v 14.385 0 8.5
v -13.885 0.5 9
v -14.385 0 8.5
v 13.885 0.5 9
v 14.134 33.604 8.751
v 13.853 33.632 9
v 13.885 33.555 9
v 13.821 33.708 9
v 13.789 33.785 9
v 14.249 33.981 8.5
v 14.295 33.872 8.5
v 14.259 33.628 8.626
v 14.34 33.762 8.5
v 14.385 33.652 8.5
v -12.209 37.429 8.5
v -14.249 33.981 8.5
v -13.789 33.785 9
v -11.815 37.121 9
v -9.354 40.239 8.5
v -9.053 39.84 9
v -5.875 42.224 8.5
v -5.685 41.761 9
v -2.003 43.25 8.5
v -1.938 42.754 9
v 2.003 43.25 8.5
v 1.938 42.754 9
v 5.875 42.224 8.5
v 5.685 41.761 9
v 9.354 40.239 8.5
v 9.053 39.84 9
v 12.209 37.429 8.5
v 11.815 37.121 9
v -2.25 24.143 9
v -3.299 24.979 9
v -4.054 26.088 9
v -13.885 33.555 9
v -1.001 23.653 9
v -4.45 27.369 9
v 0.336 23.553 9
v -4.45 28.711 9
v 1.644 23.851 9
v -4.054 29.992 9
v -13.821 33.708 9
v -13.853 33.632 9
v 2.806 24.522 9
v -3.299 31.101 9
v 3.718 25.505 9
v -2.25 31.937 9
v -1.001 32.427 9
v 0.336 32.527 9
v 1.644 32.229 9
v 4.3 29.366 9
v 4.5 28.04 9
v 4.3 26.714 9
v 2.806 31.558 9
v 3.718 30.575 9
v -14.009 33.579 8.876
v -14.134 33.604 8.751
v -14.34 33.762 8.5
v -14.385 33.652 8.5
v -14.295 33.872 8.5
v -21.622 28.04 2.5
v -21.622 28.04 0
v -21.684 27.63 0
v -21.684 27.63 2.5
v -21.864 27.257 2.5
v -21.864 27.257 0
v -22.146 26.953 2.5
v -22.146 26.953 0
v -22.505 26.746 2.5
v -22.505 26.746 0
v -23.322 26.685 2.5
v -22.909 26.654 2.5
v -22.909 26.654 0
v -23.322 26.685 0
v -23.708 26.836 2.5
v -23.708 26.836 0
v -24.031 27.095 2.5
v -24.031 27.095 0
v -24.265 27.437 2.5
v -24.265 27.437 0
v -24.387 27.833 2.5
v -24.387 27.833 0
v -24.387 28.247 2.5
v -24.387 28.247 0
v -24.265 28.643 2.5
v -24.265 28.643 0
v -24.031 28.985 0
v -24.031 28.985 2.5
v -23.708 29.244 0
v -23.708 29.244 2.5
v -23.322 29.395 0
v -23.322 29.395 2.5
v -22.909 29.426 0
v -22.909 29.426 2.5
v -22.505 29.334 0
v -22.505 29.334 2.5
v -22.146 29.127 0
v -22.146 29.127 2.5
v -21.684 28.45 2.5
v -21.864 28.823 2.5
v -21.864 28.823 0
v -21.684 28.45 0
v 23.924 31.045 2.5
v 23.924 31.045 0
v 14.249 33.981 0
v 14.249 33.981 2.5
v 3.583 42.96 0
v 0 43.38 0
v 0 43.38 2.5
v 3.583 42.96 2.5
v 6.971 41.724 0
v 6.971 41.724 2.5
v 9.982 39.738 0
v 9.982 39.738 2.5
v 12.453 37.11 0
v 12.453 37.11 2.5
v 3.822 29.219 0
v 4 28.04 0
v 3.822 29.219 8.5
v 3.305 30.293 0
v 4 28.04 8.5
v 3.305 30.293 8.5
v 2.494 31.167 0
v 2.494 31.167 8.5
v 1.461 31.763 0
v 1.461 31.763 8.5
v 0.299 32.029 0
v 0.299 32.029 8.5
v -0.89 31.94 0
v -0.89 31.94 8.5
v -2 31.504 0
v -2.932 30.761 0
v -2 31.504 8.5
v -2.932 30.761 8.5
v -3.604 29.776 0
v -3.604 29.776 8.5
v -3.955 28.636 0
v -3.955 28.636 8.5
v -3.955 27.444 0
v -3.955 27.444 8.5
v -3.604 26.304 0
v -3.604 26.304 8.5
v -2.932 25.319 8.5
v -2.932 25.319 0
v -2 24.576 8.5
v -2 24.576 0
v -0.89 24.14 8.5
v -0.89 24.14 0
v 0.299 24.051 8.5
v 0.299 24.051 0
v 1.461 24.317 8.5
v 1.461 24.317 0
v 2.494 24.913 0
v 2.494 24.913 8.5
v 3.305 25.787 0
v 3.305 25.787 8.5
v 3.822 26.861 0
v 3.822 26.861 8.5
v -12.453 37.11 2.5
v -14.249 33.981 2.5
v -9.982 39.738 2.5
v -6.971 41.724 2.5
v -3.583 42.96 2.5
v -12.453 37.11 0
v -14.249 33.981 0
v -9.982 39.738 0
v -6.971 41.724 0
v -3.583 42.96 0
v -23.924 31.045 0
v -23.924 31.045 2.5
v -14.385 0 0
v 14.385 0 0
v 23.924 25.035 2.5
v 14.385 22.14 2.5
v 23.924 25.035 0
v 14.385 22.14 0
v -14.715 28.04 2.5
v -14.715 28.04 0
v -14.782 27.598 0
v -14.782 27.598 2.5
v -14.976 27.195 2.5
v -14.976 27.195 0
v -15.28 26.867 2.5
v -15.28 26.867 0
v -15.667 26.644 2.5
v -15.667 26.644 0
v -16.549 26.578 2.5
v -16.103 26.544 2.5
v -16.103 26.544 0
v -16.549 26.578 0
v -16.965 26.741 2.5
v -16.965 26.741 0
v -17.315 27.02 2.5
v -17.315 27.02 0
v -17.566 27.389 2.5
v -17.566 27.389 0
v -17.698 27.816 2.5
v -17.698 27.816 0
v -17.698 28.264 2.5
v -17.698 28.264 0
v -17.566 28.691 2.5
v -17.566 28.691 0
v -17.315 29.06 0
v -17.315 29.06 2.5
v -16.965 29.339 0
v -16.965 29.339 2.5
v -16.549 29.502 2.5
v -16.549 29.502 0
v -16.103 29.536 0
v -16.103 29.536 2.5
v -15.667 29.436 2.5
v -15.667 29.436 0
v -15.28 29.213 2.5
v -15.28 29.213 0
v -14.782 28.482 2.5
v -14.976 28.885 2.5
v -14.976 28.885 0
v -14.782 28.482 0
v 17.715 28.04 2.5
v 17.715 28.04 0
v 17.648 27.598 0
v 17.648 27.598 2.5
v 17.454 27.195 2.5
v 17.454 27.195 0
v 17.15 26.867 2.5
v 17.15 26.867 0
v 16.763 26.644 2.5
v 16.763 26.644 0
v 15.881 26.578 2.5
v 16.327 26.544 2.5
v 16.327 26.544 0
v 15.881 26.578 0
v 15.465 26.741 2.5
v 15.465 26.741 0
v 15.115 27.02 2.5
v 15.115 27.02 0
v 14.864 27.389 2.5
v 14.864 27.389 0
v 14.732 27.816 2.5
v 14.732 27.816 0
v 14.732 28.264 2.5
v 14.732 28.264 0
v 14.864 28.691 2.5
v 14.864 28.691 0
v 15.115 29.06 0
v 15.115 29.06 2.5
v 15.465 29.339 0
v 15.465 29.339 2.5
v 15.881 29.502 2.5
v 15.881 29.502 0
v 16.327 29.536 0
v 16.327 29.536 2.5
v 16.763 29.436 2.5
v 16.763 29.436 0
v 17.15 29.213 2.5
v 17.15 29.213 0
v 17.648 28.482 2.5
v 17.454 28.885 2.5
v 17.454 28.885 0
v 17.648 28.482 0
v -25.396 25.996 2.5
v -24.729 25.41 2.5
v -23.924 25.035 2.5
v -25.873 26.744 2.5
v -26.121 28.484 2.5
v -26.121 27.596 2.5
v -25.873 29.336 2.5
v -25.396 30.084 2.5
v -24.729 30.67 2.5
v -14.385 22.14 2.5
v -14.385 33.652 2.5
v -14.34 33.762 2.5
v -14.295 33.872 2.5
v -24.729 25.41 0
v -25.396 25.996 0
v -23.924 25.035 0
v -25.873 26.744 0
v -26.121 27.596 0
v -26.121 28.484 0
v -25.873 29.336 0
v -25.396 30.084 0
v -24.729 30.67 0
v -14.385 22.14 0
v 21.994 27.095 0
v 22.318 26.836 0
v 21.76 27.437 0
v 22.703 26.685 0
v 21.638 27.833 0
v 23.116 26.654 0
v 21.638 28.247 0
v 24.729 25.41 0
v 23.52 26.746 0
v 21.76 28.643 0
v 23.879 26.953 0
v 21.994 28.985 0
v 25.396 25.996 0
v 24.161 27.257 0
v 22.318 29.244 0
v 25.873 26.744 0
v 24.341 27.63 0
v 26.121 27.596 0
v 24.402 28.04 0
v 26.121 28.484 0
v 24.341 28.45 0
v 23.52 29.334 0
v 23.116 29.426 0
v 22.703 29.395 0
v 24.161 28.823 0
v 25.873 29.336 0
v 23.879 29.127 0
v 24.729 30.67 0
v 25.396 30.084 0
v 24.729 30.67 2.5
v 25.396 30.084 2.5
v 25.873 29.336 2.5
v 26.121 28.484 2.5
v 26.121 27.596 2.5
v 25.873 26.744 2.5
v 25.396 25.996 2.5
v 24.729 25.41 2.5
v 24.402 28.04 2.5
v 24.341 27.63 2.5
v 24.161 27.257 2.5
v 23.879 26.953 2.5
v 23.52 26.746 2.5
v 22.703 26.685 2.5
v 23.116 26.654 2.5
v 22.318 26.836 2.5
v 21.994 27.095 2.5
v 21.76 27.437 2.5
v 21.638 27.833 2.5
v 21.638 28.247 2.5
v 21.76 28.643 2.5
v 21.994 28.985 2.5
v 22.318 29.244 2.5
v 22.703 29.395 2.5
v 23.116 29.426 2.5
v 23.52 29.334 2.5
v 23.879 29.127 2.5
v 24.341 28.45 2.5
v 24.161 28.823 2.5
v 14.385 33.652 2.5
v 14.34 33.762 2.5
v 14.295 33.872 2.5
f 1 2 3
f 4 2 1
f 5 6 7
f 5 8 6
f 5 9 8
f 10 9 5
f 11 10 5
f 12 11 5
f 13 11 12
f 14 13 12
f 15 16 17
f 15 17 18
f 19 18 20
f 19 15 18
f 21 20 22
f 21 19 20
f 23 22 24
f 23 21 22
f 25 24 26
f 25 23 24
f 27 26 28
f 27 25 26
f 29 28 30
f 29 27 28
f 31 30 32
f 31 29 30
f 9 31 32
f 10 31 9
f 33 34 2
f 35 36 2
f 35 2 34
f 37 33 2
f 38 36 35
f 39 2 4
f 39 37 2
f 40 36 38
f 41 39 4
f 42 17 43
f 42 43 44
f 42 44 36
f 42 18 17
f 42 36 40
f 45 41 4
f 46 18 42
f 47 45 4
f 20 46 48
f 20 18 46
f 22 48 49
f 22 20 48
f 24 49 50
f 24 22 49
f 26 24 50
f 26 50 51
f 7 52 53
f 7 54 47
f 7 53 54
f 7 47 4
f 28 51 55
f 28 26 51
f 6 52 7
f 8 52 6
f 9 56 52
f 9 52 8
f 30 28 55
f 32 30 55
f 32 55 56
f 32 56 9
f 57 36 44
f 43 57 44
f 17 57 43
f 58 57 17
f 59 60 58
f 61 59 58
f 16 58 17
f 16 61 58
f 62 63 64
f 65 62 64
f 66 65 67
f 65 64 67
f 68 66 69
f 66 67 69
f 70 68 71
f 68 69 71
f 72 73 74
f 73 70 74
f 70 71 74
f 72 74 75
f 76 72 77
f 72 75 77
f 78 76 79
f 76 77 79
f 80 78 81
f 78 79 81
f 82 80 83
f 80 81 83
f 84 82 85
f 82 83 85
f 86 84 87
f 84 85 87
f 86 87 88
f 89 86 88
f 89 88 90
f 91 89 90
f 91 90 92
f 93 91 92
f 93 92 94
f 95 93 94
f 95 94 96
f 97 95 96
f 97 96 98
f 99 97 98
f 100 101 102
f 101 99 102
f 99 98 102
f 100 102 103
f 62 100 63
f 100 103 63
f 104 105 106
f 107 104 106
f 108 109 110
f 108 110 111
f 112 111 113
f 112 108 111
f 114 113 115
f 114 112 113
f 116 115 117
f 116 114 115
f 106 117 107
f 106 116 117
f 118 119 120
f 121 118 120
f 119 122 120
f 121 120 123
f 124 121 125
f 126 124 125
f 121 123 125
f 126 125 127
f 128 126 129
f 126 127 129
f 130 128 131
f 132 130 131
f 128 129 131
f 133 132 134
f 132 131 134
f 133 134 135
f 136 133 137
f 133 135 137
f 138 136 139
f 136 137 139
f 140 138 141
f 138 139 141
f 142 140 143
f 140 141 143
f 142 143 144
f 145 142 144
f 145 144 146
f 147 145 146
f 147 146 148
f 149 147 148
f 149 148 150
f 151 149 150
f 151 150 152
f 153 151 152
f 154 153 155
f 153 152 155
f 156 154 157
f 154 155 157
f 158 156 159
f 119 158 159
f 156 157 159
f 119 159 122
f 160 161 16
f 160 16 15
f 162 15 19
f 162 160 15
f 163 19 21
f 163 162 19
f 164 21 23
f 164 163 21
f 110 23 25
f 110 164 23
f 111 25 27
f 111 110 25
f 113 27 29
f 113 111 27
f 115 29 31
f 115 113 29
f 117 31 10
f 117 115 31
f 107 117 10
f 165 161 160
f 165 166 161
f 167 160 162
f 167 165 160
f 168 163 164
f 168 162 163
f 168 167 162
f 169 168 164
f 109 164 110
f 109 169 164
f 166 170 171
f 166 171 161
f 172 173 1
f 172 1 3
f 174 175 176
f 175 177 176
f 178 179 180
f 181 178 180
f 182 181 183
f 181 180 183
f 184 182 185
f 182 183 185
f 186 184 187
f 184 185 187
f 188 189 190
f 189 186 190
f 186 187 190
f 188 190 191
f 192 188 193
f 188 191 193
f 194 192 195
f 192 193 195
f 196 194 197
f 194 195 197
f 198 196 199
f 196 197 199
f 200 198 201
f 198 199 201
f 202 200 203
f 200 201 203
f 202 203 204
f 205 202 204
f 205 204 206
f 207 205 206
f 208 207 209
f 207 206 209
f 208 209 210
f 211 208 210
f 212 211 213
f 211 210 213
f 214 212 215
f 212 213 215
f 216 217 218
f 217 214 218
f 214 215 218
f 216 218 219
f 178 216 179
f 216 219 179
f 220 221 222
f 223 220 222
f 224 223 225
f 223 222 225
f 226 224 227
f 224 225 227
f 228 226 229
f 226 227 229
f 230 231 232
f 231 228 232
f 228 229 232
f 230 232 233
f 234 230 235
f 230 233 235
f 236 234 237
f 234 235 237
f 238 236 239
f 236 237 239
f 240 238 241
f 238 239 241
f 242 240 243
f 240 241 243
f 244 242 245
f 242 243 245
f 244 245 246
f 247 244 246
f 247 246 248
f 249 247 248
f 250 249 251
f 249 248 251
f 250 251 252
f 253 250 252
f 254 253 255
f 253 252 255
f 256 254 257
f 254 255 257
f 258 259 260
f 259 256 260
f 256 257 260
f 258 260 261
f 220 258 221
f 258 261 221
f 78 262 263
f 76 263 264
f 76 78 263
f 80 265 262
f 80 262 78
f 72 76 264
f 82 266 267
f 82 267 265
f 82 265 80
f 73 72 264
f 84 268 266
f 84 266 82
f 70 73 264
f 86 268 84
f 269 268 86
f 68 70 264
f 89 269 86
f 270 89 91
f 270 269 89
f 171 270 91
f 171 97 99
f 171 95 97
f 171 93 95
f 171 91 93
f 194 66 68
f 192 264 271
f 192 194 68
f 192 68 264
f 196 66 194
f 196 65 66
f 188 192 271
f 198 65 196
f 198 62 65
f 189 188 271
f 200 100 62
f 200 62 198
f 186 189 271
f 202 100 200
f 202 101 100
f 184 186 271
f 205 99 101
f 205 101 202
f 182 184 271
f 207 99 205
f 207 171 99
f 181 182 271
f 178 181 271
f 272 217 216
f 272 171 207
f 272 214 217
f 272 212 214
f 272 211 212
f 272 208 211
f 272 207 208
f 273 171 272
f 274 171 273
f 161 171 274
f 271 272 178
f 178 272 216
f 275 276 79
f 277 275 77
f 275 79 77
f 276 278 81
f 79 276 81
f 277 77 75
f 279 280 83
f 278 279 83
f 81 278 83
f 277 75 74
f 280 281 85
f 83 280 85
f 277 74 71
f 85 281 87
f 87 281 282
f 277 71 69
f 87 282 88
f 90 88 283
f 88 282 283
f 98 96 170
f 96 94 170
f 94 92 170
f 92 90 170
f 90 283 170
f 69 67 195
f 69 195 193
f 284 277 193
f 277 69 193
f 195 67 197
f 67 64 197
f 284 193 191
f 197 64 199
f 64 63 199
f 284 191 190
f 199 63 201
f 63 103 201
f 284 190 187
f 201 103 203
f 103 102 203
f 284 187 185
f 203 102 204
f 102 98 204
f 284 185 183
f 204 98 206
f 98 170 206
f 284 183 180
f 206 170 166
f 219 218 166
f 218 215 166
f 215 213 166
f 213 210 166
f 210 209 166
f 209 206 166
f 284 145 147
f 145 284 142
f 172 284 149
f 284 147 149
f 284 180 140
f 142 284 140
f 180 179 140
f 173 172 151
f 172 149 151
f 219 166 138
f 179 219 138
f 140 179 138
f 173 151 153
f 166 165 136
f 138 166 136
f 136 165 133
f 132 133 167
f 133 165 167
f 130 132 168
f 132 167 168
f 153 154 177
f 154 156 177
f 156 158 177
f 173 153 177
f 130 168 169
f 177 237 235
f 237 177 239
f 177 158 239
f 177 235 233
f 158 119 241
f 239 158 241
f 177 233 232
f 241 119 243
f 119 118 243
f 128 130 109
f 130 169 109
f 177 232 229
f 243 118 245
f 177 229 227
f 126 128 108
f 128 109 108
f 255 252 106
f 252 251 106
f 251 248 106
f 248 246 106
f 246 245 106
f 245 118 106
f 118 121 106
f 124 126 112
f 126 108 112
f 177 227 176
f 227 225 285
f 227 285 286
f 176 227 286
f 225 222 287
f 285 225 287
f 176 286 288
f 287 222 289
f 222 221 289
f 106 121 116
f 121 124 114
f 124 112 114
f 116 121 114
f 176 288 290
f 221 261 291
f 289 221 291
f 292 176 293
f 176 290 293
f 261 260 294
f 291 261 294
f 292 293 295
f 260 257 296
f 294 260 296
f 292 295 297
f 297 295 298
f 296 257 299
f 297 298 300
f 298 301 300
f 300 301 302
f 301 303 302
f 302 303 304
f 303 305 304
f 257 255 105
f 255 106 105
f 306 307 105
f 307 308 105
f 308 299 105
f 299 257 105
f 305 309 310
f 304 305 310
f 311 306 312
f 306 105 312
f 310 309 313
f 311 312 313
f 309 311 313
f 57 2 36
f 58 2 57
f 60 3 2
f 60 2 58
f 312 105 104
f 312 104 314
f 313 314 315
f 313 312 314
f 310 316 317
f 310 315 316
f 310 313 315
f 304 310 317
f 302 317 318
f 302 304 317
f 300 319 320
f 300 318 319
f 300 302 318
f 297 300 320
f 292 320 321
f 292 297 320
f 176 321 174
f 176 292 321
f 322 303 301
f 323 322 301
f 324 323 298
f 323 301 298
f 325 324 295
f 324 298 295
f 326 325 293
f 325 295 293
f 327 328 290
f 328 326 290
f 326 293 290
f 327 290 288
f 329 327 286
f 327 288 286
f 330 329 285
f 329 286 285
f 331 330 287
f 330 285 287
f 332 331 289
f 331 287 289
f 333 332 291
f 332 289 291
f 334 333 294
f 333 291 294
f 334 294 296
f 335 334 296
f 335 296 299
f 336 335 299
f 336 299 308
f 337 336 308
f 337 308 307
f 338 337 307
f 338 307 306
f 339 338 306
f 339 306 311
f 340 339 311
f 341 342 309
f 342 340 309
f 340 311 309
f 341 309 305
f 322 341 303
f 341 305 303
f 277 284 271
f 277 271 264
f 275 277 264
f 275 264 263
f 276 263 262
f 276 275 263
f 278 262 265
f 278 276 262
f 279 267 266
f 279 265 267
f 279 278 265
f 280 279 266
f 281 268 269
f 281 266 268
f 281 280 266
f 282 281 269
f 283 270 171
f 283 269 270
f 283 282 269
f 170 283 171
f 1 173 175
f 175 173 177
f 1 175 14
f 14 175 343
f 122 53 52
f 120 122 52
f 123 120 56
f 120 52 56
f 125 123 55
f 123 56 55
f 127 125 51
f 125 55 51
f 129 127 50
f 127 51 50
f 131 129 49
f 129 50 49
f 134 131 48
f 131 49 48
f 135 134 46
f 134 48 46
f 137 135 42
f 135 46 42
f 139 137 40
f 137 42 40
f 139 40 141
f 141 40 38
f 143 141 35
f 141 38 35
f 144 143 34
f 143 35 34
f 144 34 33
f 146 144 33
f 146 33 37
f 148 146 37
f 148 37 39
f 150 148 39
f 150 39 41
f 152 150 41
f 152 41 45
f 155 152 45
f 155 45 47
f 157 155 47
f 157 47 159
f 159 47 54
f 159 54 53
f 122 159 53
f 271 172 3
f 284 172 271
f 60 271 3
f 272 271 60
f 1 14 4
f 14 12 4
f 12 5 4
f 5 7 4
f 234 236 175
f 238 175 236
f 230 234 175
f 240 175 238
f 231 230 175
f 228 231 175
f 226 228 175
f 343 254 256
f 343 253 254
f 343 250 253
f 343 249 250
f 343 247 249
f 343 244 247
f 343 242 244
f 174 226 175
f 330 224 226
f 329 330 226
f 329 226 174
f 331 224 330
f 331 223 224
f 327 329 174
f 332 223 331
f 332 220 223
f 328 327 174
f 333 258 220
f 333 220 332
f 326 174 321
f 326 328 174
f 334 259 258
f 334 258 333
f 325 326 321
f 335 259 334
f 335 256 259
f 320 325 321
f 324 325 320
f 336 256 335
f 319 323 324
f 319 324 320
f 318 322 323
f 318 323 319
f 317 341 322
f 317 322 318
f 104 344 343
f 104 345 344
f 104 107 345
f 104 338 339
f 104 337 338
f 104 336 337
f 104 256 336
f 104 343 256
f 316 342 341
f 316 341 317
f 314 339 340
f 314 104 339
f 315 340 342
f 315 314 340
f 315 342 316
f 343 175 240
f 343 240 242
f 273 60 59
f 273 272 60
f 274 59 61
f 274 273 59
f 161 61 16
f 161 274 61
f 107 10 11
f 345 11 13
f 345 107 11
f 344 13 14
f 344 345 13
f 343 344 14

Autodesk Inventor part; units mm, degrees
ref_plane "YZ Plane" through (0, 0, 0) normal (1, 0, 0) x (0, 1, 0)
ref_plane "XZ Plane" through (0, 0, 0) normal (0, 1, 0) x (-1, 0, 0)
ref_plane "XY Plane" through (0, 0, 0) normal (0, 0, 1) x (1, 0, 0)
sketch "スケッチ1" plane through (0, 0, 0) normal (0, 0, 1) x (1, 0, 0)
  line L0 (0, 0) -> (14.385, 0)
  line L1 (14.385, 0) -> (14.385, 22.14)
  line L2 (14.385, 22.14) -> (23.9245, 25.0353)
  line L3 (23.9245, 31.0447) -> (14.2486, 33.9814)
  line L4 (0, 0) -> (0, 43.38) construction
  arc A0 (14.2486, 33.9814) -> (0, 43.38) centre (0, 27.88) ccw
  circle A1 centre (0, 28.04) radius 4 construction
  line L5 (0, 28.04) -> (33.824, 28.04) construction
  circle A2 centre (16.215, 28.04) radius 1.5
  circle A3 centre (23.0125, 28.04) radius 1.39
  arc A4 (23.9245, 25.0353) -> (23.9245, 31.0447) centre (23.0125, 28.04) ccw
  line L6 (0, 0) -> (-14.385, 0)
  line L7 (-14.385, 0) -> (-14.385, 22.14)
  line L8 (-14.385, 22.14) -> (-23.9245, 25.0353)
  line L9 (-23.9245, 31.0447) -> (-14.2486, 33.9814)
  arc A5 (0, 43.38) -> (-14.2486, 33.9814) centre (0, 27.88) ccw
  circle A6 centre (-16.215, 28.04) radius 1.5
  circle A7 centre (-23.0125, 28.04) radius 1.39
  arc A8 (-23.9245, 31.0447) -> (-23.9245, 25.0353) centre (-23.0125, 28.04) ccw
  dimension "d0" = 15.5
  dimension "d1" = 43.38
  dimension "d2" = 15.34
  dimension "d3" = 8
  dimension "d4" = 14.385
  dimension "d5" = 5.9
  dimension "d6" = 2.78
  dimension "d7" = 3
  dimension "d8" = 16.215
  dimension "d9" = 23.0125
  dimension "d12" = 3.14
extrude "押し出し1" add sketch "スケッチ1" along normal blind 2.5
sketch "スケッチ4" plane through (0, 0, 2.5) normal (0, 0, 1) x (1, 0, 0)
  line L0 (-14.385, 0) -> (14.385, 0) projected
  line L1 (-14.385, 0) -> (14.385, 0)
  line L2 (14.385, 0) -> (14.385, 33.6525)
  arc A0 (14.2486, 33.9814) -> (-14.2486, 33.9814) centre (0, 27.88) ccw projected
  arc A1 (14.385, 33.6525) -> (-14.385, 33.6525) centre (0, 27.88) ccw
  line L3 (-14.385, 0) -> (-14.385, 33.6525)
  point P0 (0, 0)
extrude "押し出し3" add sketch "スケッチ4" along normal blind 6.5
sketch "スケッチ5" plane through (0, 0, 9) normal (0, 0, 1) x (1, 0, 0)
  line L0 (0, 0) -> (0, 28.04) construction
  circle A0 centre (0, 28.04) radius 4
  arc A1 (14.2486, 33.9814) -> (-14.2486, 33.9814) centre (0, 27.88) ccw construction
  point P0 (0, 43.38)
  dimension "d20" = 15.34
  dimension "d21" = 8
extrude "押し出し4" cut sketch "スケッチ5" against normal up to next
chamfer "面取り1" distance 0.5 angle 45 5 edges at (-14.385, 16.8263, 9) (0, 0, 9) (14.385, 16.8263, 9) (0, 43.38, 9) (-4, 28.04, 9)
properties part number "AMT102-1"
